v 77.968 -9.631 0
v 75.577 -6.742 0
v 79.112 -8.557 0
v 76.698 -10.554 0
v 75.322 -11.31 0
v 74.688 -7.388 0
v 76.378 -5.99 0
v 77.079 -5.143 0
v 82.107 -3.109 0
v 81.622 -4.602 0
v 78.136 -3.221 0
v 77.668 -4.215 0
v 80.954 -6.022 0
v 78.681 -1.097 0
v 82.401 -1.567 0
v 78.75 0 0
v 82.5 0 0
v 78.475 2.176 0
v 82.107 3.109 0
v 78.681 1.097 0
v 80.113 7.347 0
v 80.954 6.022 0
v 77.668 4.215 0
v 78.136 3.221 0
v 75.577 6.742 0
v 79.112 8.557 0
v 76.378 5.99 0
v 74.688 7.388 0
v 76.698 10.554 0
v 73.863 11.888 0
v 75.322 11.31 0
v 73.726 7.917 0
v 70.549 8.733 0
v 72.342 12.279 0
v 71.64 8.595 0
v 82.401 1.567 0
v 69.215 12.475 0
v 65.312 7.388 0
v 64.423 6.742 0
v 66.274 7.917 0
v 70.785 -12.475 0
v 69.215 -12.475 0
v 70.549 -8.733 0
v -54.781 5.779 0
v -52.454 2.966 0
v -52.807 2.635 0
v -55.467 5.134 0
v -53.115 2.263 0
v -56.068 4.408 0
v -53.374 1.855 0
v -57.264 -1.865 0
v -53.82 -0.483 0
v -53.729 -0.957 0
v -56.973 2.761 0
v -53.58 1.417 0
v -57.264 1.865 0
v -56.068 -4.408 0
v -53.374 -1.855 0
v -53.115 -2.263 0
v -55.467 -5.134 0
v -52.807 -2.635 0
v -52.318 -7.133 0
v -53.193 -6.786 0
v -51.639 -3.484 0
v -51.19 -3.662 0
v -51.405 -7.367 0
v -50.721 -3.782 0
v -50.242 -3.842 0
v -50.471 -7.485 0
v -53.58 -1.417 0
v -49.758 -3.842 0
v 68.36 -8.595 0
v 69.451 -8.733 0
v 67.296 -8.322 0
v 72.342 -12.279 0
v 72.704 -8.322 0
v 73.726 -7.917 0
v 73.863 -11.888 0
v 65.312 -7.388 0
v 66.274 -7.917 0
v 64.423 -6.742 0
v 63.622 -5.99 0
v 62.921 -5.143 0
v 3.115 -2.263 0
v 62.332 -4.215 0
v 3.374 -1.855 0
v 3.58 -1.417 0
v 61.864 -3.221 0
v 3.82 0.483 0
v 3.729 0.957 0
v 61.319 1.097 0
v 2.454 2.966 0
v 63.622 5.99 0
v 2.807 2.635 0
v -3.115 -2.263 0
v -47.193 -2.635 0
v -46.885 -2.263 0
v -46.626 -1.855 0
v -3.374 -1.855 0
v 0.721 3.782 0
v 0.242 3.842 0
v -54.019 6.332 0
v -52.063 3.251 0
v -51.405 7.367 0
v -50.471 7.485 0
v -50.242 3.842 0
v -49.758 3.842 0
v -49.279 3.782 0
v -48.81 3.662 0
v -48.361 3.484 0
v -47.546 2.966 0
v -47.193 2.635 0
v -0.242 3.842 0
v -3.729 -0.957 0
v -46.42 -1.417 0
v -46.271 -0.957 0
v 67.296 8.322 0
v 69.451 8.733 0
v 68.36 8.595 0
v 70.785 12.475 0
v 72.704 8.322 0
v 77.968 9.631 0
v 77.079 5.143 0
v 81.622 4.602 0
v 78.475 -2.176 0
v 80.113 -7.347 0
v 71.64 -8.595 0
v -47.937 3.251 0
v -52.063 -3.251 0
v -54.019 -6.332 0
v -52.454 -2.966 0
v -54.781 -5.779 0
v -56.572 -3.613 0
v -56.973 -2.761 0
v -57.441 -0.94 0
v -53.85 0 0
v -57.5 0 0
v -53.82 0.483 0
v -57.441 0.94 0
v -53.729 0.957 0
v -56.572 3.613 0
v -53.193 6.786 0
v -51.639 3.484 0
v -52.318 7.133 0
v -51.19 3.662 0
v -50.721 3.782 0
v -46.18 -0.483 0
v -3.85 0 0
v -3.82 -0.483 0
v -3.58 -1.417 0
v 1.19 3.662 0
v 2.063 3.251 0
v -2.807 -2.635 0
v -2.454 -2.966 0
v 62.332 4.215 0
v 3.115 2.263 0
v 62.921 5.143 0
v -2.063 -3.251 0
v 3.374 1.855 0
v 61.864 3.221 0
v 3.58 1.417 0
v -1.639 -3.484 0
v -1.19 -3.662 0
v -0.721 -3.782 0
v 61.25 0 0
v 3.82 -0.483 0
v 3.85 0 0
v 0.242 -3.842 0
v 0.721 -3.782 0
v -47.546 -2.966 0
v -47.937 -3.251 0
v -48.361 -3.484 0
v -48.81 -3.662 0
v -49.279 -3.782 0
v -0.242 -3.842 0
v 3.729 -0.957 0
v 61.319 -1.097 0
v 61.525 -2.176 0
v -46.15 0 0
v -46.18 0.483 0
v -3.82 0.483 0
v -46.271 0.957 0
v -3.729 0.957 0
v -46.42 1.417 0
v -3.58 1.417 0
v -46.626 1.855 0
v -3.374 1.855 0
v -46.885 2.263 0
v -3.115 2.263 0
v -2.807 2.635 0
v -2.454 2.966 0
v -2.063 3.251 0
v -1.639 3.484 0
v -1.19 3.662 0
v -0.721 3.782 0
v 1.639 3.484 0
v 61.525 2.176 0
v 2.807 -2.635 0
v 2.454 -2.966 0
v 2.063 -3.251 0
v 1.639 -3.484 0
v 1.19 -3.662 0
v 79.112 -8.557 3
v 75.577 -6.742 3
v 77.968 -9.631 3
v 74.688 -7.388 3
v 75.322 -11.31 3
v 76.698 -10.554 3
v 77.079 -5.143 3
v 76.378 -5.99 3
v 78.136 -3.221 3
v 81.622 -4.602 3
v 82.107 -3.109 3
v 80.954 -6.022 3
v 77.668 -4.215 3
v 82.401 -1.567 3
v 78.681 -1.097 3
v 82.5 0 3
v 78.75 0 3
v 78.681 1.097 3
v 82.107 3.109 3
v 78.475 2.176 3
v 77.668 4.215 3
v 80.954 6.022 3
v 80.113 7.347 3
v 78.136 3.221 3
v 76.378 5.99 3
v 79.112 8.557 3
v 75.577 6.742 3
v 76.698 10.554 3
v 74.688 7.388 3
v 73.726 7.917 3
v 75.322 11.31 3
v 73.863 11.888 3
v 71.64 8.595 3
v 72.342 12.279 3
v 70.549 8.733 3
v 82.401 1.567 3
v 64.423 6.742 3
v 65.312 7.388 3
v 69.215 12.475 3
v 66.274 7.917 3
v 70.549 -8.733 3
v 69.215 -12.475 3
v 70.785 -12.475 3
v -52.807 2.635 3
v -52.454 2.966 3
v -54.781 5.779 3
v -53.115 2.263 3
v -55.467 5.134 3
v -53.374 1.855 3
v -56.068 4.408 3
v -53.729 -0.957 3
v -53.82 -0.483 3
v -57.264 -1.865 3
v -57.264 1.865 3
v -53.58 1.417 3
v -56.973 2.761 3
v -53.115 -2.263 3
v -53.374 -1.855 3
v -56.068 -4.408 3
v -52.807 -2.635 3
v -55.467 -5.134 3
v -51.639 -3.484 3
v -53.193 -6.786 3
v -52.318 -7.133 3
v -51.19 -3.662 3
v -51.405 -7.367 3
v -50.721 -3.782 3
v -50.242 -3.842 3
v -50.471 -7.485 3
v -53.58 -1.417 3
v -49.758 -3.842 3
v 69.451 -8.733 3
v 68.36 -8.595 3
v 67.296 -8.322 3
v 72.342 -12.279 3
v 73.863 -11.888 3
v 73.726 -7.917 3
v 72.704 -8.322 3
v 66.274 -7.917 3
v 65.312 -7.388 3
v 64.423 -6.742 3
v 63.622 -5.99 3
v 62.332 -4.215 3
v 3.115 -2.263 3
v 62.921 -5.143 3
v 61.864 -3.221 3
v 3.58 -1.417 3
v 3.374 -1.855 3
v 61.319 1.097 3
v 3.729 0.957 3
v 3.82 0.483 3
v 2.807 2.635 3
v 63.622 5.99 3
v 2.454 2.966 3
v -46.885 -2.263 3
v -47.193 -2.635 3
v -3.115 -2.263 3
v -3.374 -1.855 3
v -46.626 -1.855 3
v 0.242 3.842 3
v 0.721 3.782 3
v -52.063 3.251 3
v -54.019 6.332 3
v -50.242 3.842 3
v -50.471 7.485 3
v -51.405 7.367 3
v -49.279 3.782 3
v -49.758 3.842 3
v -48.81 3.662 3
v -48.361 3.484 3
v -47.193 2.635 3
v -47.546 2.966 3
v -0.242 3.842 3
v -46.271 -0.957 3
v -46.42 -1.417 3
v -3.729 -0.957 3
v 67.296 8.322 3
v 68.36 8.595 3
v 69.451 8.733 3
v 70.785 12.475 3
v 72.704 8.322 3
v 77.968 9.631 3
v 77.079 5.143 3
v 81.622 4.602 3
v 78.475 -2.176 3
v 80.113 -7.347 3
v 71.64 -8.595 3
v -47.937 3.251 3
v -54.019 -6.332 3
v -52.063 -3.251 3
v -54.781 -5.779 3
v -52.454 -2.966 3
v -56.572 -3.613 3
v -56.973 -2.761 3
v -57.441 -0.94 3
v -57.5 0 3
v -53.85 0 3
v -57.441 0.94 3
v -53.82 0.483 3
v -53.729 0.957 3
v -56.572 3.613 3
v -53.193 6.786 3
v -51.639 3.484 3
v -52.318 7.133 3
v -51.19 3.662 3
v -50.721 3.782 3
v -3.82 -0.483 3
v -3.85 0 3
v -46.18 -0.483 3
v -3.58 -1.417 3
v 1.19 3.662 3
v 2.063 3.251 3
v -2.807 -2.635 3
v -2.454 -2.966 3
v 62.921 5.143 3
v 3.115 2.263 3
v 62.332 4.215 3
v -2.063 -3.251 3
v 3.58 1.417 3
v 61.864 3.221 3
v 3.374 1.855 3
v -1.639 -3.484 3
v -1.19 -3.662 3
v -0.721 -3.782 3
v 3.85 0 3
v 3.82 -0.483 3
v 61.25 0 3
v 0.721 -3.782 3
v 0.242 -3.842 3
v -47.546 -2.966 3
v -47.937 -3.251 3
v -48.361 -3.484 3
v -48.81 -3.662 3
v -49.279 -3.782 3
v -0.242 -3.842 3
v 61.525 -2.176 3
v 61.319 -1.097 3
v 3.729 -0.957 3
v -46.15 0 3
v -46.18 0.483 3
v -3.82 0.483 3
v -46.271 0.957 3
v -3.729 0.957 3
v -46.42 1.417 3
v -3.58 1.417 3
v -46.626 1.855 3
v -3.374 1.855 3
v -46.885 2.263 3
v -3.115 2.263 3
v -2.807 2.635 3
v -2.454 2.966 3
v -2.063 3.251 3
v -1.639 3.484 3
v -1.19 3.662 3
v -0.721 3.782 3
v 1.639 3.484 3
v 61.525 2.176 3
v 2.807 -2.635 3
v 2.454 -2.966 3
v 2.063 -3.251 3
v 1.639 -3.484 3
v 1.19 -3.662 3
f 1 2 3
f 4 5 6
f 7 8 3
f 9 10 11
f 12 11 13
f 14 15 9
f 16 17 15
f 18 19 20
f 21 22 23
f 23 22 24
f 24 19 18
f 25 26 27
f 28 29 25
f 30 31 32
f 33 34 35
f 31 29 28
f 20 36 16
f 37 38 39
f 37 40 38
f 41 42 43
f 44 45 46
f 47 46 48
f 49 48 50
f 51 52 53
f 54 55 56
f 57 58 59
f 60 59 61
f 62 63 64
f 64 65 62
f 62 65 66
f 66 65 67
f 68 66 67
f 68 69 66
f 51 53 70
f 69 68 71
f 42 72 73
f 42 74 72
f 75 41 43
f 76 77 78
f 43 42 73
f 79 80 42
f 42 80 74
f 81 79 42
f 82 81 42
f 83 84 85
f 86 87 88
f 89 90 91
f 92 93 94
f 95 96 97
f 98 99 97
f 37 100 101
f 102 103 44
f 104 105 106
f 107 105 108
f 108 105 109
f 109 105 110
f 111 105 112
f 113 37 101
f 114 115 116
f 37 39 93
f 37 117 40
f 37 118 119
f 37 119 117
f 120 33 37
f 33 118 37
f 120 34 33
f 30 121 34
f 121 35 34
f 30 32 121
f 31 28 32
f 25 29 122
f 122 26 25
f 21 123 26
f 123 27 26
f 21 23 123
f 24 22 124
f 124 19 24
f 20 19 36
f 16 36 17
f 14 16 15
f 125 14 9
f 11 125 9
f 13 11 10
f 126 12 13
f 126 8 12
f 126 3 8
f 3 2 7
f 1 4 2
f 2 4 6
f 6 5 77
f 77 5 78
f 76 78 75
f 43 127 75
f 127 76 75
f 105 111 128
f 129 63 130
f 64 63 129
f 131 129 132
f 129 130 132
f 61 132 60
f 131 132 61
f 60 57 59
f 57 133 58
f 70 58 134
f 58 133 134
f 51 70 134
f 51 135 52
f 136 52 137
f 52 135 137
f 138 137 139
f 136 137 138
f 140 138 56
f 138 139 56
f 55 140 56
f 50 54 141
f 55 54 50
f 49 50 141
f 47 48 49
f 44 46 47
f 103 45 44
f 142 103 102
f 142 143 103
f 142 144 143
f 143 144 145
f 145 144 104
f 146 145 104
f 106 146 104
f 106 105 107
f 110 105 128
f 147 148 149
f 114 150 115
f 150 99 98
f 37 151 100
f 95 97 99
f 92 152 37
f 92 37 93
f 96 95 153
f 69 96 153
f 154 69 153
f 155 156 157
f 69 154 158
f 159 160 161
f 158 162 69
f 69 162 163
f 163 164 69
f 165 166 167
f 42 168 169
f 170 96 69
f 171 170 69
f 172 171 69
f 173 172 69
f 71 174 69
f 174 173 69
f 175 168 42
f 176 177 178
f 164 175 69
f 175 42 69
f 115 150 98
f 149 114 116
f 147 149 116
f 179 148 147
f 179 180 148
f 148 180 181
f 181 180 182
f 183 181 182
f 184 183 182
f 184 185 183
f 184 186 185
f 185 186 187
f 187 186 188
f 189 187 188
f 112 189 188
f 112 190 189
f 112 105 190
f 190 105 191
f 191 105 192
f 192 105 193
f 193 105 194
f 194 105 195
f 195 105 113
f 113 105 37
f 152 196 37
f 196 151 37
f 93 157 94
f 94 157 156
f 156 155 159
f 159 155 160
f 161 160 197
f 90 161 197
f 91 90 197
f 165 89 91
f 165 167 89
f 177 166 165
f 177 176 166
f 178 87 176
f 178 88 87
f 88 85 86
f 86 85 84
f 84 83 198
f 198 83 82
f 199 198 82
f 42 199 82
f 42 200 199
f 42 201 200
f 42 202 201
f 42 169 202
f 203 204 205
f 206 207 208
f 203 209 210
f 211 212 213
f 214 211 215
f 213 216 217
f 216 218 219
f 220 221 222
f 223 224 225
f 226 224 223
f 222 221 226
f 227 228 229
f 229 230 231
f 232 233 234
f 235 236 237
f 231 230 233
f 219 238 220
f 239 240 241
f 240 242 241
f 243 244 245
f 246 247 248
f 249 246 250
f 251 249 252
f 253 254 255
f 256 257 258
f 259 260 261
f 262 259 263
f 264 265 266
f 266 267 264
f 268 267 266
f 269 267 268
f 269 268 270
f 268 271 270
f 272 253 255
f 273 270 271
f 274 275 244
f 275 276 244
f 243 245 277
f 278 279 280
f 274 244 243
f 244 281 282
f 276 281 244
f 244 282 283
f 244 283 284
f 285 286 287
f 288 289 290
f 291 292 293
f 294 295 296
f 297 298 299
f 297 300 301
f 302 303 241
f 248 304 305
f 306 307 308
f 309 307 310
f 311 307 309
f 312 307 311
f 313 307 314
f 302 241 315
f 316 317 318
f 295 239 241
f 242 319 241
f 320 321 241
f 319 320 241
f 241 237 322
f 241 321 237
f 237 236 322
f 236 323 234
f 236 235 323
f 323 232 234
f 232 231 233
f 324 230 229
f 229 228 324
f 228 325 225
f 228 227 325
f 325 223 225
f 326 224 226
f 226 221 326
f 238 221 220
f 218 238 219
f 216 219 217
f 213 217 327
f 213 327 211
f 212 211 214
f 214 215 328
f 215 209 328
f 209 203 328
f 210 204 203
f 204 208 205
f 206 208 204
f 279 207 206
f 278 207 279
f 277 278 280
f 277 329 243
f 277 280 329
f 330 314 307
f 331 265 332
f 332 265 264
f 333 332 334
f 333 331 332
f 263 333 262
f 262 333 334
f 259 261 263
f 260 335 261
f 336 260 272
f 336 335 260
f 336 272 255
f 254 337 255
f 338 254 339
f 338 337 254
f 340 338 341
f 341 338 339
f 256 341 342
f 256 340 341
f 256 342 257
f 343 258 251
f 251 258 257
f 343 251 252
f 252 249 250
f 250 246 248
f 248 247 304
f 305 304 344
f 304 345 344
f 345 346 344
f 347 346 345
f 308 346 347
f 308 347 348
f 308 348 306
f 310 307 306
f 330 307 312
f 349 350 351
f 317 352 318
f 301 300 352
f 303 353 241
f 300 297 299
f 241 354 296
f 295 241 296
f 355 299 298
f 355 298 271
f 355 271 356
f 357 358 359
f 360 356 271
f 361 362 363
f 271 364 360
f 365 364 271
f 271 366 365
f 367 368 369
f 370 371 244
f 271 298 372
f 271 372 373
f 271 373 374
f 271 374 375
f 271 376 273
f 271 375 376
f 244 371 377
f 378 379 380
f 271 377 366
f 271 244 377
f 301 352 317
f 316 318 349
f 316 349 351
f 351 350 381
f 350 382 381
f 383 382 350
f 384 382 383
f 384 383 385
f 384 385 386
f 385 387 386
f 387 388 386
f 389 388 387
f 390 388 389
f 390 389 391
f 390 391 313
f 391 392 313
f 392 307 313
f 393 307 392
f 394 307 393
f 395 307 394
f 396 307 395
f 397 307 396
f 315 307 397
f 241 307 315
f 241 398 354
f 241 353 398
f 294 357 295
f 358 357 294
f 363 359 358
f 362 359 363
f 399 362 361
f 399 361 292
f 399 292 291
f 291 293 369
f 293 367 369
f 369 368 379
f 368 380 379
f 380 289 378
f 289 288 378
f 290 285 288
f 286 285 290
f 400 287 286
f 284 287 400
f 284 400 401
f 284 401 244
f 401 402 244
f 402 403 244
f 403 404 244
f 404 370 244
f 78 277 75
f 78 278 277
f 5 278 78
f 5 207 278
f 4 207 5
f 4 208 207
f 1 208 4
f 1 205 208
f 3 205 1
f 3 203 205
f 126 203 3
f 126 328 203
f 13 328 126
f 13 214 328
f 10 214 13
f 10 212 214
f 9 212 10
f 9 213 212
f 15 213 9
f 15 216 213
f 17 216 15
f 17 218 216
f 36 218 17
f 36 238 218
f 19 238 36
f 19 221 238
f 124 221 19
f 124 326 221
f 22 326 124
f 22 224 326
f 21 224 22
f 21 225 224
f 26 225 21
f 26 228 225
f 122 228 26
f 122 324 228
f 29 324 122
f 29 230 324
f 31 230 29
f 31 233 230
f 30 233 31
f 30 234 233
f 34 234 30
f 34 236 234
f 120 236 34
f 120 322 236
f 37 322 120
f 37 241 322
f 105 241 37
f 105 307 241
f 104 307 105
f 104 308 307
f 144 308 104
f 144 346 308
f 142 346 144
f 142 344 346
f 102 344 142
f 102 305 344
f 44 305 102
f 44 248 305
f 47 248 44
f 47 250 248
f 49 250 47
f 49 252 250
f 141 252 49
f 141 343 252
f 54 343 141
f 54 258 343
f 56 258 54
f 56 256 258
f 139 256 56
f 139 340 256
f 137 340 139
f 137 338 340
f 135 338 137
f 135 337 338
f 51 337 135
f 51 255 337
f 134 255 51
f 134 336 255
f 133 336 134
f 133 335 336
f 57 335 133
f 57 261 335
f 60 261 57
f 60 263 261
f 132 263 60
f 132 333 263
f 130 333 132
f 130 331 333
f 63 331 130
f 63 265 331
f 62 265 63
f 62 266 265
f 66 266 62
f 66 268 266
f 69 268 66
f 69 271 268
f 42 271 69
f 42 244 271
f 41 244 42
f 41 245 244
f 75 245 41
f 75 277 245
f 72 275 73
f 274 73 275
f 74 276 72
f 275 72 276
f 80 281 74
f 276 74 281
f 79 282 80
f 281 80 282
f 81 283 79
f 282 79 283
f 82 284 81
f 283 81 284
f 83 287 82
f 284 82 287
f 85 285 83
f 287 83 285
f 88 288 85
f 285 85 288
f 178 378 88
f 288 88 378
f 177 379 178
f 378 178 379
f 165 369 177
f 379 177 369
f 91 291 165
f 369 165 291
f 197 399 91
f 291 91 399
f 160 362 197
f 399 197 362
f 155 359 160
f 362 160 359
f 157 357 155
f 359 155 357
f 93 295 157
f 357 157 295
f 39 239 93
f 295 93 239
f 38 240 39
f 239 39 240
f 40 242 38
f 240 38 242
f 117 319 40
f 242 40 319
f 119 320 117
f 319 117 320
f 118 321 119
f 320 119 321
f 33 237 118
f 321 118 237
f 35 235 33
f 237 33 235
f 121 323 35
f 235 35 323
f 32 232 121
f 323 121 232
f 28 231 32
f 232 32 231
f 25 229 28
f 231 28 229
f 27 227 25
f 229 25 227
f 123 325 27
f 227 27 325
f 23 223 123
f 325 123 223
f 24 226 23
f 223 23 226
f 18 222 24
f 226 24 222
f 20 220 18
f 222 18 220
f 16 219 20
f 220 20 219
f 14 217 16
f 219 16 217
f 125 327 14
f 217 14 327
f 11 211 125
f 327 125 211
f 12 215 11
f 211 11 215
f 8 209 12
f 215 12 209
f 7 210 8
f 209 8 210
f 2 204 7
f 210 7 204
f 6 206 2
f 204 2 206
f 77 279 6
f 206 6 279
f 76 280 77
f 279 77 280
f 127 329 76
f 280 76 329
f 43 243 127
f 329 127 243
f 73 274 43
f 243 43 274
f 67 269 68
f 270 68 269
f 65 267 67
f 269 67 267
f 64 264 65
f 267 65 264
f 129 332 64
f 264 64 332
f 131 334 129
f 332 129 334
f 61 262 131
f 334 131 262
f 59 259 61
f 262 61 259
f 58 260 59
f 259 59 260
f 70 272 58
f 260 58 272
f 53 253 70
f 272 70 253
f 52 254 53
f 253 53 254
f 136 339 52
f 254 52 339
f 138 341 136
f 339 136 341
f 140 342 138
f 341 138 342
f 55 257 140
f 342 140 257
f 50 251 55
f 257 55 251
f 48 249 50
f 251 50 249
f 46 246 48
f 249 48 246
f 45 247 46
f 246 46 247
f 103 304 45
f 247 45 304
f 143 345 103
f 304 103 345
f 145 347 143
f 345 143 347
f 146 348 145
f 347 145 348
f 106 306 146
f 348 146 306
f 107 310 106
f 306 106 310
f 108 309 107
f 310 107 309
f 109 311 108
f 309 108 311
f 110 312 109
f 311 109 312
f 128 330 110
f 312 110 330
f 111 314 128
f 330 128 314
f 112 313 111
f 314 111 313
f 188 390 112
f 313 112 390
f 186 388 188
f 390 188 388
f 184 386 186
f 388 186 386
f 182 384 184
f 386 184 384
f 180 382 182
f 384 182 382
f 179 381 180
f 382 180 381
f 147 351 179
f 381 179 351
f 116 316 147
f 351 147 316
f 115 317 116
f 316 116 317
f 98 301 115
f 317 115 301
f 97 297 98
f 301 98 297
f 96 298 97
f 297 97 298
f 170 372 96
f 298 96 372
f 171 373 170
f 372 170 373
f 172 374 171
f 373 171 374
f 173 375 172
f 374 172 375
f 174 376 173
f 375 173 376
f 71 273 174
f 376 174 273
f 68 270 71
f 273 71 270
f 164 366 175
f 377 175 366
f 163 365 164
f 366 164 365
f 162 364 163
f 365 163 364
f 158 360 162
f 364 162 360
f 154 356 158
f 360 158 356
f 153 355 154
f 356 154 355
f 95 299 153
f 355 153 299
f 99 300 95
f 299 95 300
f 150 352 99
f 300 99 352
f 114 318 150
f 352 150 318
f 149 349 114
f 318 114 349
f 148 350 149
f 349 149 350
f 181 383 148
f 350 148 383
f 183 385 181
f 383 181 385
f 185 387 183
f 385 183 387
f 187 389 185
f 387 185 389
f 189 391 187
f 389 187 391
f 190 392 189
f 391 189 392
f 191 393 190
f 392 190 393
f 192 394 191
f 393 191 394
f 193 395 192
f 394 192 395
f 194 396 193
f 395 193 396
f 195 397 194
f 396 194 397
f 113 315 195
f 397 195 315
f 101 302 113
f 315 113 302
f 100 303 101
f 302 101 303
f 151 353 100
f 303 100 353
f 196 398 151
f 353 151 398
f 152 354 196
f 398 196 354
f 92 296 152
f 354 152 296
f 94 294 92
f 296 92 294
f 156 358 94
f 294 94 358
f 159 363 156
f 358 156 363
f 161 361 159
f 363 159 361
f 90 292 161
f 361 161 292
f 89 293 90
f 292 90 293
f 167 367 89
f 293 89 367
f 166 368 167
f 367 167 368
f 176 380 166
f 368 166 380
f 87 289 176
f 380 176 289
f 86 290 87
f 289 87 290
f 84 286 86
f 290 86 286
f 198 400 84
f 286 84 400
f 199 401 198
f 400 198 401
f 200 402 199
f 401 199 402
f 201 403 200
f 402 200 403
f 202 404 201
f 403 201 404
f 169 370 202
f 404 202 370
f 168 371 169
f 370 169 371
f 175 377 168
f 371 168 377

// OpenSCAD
// file: config.scad
/* Author: Antonio Navarro
 * License: LGPLv2.1
 * 
 * This is my desing of a Trammel of Archimedes in OpenSCAD
 * Feel free to modify.
 *
 * Configuration file
 */

$fn=50;

/****** Slider parameters *****/
slider_height=30;
slider_lenght=30;
top_width=15;
down_width=25;
rad_round=5;
slider_axe=top_width/2;

/****** base parameters *****/
base_lenght=100;
base_thickness=3;
base_rad=10;
base_height=slider_height;

/****** arm parameters *****/
arm_thickness=3;
arm_lenght=base_lenght;
arm_width=top_width;
// main file
/* Author: Antonio Navarro
 * License: LGPLv2.1
 * 
 * This is my desing of a Trammel of Archimedes in OpenSCAD
 * Feel free to modify.
 * 
 * Edit 'config.scad' to change parameters.
 *
 * Arm desing
 *
 */

include <config.scad>

module arm(){

	ext_lenght=20;
	ext_width=10;
	gap=0.2;

	linear_extrude(height=arm_thickness)
		translate([-arm_lenght/2,0,0])
			difference(){
				hull(){
					circle(d=arm_width);
					translate([arm_lenght+ext_lenght,0,0])
						circle(d=arm_width+ext_width);
				}
				circle(d=slider_axe+gap);
				translate([arm_lenght/2,0,0])
					circle(d=slider_axe+gap);
				translate([arm_lenght+ext_lenght,0,0])
					circle(d=slider_axe+ext_width);
			}
}

arm();
